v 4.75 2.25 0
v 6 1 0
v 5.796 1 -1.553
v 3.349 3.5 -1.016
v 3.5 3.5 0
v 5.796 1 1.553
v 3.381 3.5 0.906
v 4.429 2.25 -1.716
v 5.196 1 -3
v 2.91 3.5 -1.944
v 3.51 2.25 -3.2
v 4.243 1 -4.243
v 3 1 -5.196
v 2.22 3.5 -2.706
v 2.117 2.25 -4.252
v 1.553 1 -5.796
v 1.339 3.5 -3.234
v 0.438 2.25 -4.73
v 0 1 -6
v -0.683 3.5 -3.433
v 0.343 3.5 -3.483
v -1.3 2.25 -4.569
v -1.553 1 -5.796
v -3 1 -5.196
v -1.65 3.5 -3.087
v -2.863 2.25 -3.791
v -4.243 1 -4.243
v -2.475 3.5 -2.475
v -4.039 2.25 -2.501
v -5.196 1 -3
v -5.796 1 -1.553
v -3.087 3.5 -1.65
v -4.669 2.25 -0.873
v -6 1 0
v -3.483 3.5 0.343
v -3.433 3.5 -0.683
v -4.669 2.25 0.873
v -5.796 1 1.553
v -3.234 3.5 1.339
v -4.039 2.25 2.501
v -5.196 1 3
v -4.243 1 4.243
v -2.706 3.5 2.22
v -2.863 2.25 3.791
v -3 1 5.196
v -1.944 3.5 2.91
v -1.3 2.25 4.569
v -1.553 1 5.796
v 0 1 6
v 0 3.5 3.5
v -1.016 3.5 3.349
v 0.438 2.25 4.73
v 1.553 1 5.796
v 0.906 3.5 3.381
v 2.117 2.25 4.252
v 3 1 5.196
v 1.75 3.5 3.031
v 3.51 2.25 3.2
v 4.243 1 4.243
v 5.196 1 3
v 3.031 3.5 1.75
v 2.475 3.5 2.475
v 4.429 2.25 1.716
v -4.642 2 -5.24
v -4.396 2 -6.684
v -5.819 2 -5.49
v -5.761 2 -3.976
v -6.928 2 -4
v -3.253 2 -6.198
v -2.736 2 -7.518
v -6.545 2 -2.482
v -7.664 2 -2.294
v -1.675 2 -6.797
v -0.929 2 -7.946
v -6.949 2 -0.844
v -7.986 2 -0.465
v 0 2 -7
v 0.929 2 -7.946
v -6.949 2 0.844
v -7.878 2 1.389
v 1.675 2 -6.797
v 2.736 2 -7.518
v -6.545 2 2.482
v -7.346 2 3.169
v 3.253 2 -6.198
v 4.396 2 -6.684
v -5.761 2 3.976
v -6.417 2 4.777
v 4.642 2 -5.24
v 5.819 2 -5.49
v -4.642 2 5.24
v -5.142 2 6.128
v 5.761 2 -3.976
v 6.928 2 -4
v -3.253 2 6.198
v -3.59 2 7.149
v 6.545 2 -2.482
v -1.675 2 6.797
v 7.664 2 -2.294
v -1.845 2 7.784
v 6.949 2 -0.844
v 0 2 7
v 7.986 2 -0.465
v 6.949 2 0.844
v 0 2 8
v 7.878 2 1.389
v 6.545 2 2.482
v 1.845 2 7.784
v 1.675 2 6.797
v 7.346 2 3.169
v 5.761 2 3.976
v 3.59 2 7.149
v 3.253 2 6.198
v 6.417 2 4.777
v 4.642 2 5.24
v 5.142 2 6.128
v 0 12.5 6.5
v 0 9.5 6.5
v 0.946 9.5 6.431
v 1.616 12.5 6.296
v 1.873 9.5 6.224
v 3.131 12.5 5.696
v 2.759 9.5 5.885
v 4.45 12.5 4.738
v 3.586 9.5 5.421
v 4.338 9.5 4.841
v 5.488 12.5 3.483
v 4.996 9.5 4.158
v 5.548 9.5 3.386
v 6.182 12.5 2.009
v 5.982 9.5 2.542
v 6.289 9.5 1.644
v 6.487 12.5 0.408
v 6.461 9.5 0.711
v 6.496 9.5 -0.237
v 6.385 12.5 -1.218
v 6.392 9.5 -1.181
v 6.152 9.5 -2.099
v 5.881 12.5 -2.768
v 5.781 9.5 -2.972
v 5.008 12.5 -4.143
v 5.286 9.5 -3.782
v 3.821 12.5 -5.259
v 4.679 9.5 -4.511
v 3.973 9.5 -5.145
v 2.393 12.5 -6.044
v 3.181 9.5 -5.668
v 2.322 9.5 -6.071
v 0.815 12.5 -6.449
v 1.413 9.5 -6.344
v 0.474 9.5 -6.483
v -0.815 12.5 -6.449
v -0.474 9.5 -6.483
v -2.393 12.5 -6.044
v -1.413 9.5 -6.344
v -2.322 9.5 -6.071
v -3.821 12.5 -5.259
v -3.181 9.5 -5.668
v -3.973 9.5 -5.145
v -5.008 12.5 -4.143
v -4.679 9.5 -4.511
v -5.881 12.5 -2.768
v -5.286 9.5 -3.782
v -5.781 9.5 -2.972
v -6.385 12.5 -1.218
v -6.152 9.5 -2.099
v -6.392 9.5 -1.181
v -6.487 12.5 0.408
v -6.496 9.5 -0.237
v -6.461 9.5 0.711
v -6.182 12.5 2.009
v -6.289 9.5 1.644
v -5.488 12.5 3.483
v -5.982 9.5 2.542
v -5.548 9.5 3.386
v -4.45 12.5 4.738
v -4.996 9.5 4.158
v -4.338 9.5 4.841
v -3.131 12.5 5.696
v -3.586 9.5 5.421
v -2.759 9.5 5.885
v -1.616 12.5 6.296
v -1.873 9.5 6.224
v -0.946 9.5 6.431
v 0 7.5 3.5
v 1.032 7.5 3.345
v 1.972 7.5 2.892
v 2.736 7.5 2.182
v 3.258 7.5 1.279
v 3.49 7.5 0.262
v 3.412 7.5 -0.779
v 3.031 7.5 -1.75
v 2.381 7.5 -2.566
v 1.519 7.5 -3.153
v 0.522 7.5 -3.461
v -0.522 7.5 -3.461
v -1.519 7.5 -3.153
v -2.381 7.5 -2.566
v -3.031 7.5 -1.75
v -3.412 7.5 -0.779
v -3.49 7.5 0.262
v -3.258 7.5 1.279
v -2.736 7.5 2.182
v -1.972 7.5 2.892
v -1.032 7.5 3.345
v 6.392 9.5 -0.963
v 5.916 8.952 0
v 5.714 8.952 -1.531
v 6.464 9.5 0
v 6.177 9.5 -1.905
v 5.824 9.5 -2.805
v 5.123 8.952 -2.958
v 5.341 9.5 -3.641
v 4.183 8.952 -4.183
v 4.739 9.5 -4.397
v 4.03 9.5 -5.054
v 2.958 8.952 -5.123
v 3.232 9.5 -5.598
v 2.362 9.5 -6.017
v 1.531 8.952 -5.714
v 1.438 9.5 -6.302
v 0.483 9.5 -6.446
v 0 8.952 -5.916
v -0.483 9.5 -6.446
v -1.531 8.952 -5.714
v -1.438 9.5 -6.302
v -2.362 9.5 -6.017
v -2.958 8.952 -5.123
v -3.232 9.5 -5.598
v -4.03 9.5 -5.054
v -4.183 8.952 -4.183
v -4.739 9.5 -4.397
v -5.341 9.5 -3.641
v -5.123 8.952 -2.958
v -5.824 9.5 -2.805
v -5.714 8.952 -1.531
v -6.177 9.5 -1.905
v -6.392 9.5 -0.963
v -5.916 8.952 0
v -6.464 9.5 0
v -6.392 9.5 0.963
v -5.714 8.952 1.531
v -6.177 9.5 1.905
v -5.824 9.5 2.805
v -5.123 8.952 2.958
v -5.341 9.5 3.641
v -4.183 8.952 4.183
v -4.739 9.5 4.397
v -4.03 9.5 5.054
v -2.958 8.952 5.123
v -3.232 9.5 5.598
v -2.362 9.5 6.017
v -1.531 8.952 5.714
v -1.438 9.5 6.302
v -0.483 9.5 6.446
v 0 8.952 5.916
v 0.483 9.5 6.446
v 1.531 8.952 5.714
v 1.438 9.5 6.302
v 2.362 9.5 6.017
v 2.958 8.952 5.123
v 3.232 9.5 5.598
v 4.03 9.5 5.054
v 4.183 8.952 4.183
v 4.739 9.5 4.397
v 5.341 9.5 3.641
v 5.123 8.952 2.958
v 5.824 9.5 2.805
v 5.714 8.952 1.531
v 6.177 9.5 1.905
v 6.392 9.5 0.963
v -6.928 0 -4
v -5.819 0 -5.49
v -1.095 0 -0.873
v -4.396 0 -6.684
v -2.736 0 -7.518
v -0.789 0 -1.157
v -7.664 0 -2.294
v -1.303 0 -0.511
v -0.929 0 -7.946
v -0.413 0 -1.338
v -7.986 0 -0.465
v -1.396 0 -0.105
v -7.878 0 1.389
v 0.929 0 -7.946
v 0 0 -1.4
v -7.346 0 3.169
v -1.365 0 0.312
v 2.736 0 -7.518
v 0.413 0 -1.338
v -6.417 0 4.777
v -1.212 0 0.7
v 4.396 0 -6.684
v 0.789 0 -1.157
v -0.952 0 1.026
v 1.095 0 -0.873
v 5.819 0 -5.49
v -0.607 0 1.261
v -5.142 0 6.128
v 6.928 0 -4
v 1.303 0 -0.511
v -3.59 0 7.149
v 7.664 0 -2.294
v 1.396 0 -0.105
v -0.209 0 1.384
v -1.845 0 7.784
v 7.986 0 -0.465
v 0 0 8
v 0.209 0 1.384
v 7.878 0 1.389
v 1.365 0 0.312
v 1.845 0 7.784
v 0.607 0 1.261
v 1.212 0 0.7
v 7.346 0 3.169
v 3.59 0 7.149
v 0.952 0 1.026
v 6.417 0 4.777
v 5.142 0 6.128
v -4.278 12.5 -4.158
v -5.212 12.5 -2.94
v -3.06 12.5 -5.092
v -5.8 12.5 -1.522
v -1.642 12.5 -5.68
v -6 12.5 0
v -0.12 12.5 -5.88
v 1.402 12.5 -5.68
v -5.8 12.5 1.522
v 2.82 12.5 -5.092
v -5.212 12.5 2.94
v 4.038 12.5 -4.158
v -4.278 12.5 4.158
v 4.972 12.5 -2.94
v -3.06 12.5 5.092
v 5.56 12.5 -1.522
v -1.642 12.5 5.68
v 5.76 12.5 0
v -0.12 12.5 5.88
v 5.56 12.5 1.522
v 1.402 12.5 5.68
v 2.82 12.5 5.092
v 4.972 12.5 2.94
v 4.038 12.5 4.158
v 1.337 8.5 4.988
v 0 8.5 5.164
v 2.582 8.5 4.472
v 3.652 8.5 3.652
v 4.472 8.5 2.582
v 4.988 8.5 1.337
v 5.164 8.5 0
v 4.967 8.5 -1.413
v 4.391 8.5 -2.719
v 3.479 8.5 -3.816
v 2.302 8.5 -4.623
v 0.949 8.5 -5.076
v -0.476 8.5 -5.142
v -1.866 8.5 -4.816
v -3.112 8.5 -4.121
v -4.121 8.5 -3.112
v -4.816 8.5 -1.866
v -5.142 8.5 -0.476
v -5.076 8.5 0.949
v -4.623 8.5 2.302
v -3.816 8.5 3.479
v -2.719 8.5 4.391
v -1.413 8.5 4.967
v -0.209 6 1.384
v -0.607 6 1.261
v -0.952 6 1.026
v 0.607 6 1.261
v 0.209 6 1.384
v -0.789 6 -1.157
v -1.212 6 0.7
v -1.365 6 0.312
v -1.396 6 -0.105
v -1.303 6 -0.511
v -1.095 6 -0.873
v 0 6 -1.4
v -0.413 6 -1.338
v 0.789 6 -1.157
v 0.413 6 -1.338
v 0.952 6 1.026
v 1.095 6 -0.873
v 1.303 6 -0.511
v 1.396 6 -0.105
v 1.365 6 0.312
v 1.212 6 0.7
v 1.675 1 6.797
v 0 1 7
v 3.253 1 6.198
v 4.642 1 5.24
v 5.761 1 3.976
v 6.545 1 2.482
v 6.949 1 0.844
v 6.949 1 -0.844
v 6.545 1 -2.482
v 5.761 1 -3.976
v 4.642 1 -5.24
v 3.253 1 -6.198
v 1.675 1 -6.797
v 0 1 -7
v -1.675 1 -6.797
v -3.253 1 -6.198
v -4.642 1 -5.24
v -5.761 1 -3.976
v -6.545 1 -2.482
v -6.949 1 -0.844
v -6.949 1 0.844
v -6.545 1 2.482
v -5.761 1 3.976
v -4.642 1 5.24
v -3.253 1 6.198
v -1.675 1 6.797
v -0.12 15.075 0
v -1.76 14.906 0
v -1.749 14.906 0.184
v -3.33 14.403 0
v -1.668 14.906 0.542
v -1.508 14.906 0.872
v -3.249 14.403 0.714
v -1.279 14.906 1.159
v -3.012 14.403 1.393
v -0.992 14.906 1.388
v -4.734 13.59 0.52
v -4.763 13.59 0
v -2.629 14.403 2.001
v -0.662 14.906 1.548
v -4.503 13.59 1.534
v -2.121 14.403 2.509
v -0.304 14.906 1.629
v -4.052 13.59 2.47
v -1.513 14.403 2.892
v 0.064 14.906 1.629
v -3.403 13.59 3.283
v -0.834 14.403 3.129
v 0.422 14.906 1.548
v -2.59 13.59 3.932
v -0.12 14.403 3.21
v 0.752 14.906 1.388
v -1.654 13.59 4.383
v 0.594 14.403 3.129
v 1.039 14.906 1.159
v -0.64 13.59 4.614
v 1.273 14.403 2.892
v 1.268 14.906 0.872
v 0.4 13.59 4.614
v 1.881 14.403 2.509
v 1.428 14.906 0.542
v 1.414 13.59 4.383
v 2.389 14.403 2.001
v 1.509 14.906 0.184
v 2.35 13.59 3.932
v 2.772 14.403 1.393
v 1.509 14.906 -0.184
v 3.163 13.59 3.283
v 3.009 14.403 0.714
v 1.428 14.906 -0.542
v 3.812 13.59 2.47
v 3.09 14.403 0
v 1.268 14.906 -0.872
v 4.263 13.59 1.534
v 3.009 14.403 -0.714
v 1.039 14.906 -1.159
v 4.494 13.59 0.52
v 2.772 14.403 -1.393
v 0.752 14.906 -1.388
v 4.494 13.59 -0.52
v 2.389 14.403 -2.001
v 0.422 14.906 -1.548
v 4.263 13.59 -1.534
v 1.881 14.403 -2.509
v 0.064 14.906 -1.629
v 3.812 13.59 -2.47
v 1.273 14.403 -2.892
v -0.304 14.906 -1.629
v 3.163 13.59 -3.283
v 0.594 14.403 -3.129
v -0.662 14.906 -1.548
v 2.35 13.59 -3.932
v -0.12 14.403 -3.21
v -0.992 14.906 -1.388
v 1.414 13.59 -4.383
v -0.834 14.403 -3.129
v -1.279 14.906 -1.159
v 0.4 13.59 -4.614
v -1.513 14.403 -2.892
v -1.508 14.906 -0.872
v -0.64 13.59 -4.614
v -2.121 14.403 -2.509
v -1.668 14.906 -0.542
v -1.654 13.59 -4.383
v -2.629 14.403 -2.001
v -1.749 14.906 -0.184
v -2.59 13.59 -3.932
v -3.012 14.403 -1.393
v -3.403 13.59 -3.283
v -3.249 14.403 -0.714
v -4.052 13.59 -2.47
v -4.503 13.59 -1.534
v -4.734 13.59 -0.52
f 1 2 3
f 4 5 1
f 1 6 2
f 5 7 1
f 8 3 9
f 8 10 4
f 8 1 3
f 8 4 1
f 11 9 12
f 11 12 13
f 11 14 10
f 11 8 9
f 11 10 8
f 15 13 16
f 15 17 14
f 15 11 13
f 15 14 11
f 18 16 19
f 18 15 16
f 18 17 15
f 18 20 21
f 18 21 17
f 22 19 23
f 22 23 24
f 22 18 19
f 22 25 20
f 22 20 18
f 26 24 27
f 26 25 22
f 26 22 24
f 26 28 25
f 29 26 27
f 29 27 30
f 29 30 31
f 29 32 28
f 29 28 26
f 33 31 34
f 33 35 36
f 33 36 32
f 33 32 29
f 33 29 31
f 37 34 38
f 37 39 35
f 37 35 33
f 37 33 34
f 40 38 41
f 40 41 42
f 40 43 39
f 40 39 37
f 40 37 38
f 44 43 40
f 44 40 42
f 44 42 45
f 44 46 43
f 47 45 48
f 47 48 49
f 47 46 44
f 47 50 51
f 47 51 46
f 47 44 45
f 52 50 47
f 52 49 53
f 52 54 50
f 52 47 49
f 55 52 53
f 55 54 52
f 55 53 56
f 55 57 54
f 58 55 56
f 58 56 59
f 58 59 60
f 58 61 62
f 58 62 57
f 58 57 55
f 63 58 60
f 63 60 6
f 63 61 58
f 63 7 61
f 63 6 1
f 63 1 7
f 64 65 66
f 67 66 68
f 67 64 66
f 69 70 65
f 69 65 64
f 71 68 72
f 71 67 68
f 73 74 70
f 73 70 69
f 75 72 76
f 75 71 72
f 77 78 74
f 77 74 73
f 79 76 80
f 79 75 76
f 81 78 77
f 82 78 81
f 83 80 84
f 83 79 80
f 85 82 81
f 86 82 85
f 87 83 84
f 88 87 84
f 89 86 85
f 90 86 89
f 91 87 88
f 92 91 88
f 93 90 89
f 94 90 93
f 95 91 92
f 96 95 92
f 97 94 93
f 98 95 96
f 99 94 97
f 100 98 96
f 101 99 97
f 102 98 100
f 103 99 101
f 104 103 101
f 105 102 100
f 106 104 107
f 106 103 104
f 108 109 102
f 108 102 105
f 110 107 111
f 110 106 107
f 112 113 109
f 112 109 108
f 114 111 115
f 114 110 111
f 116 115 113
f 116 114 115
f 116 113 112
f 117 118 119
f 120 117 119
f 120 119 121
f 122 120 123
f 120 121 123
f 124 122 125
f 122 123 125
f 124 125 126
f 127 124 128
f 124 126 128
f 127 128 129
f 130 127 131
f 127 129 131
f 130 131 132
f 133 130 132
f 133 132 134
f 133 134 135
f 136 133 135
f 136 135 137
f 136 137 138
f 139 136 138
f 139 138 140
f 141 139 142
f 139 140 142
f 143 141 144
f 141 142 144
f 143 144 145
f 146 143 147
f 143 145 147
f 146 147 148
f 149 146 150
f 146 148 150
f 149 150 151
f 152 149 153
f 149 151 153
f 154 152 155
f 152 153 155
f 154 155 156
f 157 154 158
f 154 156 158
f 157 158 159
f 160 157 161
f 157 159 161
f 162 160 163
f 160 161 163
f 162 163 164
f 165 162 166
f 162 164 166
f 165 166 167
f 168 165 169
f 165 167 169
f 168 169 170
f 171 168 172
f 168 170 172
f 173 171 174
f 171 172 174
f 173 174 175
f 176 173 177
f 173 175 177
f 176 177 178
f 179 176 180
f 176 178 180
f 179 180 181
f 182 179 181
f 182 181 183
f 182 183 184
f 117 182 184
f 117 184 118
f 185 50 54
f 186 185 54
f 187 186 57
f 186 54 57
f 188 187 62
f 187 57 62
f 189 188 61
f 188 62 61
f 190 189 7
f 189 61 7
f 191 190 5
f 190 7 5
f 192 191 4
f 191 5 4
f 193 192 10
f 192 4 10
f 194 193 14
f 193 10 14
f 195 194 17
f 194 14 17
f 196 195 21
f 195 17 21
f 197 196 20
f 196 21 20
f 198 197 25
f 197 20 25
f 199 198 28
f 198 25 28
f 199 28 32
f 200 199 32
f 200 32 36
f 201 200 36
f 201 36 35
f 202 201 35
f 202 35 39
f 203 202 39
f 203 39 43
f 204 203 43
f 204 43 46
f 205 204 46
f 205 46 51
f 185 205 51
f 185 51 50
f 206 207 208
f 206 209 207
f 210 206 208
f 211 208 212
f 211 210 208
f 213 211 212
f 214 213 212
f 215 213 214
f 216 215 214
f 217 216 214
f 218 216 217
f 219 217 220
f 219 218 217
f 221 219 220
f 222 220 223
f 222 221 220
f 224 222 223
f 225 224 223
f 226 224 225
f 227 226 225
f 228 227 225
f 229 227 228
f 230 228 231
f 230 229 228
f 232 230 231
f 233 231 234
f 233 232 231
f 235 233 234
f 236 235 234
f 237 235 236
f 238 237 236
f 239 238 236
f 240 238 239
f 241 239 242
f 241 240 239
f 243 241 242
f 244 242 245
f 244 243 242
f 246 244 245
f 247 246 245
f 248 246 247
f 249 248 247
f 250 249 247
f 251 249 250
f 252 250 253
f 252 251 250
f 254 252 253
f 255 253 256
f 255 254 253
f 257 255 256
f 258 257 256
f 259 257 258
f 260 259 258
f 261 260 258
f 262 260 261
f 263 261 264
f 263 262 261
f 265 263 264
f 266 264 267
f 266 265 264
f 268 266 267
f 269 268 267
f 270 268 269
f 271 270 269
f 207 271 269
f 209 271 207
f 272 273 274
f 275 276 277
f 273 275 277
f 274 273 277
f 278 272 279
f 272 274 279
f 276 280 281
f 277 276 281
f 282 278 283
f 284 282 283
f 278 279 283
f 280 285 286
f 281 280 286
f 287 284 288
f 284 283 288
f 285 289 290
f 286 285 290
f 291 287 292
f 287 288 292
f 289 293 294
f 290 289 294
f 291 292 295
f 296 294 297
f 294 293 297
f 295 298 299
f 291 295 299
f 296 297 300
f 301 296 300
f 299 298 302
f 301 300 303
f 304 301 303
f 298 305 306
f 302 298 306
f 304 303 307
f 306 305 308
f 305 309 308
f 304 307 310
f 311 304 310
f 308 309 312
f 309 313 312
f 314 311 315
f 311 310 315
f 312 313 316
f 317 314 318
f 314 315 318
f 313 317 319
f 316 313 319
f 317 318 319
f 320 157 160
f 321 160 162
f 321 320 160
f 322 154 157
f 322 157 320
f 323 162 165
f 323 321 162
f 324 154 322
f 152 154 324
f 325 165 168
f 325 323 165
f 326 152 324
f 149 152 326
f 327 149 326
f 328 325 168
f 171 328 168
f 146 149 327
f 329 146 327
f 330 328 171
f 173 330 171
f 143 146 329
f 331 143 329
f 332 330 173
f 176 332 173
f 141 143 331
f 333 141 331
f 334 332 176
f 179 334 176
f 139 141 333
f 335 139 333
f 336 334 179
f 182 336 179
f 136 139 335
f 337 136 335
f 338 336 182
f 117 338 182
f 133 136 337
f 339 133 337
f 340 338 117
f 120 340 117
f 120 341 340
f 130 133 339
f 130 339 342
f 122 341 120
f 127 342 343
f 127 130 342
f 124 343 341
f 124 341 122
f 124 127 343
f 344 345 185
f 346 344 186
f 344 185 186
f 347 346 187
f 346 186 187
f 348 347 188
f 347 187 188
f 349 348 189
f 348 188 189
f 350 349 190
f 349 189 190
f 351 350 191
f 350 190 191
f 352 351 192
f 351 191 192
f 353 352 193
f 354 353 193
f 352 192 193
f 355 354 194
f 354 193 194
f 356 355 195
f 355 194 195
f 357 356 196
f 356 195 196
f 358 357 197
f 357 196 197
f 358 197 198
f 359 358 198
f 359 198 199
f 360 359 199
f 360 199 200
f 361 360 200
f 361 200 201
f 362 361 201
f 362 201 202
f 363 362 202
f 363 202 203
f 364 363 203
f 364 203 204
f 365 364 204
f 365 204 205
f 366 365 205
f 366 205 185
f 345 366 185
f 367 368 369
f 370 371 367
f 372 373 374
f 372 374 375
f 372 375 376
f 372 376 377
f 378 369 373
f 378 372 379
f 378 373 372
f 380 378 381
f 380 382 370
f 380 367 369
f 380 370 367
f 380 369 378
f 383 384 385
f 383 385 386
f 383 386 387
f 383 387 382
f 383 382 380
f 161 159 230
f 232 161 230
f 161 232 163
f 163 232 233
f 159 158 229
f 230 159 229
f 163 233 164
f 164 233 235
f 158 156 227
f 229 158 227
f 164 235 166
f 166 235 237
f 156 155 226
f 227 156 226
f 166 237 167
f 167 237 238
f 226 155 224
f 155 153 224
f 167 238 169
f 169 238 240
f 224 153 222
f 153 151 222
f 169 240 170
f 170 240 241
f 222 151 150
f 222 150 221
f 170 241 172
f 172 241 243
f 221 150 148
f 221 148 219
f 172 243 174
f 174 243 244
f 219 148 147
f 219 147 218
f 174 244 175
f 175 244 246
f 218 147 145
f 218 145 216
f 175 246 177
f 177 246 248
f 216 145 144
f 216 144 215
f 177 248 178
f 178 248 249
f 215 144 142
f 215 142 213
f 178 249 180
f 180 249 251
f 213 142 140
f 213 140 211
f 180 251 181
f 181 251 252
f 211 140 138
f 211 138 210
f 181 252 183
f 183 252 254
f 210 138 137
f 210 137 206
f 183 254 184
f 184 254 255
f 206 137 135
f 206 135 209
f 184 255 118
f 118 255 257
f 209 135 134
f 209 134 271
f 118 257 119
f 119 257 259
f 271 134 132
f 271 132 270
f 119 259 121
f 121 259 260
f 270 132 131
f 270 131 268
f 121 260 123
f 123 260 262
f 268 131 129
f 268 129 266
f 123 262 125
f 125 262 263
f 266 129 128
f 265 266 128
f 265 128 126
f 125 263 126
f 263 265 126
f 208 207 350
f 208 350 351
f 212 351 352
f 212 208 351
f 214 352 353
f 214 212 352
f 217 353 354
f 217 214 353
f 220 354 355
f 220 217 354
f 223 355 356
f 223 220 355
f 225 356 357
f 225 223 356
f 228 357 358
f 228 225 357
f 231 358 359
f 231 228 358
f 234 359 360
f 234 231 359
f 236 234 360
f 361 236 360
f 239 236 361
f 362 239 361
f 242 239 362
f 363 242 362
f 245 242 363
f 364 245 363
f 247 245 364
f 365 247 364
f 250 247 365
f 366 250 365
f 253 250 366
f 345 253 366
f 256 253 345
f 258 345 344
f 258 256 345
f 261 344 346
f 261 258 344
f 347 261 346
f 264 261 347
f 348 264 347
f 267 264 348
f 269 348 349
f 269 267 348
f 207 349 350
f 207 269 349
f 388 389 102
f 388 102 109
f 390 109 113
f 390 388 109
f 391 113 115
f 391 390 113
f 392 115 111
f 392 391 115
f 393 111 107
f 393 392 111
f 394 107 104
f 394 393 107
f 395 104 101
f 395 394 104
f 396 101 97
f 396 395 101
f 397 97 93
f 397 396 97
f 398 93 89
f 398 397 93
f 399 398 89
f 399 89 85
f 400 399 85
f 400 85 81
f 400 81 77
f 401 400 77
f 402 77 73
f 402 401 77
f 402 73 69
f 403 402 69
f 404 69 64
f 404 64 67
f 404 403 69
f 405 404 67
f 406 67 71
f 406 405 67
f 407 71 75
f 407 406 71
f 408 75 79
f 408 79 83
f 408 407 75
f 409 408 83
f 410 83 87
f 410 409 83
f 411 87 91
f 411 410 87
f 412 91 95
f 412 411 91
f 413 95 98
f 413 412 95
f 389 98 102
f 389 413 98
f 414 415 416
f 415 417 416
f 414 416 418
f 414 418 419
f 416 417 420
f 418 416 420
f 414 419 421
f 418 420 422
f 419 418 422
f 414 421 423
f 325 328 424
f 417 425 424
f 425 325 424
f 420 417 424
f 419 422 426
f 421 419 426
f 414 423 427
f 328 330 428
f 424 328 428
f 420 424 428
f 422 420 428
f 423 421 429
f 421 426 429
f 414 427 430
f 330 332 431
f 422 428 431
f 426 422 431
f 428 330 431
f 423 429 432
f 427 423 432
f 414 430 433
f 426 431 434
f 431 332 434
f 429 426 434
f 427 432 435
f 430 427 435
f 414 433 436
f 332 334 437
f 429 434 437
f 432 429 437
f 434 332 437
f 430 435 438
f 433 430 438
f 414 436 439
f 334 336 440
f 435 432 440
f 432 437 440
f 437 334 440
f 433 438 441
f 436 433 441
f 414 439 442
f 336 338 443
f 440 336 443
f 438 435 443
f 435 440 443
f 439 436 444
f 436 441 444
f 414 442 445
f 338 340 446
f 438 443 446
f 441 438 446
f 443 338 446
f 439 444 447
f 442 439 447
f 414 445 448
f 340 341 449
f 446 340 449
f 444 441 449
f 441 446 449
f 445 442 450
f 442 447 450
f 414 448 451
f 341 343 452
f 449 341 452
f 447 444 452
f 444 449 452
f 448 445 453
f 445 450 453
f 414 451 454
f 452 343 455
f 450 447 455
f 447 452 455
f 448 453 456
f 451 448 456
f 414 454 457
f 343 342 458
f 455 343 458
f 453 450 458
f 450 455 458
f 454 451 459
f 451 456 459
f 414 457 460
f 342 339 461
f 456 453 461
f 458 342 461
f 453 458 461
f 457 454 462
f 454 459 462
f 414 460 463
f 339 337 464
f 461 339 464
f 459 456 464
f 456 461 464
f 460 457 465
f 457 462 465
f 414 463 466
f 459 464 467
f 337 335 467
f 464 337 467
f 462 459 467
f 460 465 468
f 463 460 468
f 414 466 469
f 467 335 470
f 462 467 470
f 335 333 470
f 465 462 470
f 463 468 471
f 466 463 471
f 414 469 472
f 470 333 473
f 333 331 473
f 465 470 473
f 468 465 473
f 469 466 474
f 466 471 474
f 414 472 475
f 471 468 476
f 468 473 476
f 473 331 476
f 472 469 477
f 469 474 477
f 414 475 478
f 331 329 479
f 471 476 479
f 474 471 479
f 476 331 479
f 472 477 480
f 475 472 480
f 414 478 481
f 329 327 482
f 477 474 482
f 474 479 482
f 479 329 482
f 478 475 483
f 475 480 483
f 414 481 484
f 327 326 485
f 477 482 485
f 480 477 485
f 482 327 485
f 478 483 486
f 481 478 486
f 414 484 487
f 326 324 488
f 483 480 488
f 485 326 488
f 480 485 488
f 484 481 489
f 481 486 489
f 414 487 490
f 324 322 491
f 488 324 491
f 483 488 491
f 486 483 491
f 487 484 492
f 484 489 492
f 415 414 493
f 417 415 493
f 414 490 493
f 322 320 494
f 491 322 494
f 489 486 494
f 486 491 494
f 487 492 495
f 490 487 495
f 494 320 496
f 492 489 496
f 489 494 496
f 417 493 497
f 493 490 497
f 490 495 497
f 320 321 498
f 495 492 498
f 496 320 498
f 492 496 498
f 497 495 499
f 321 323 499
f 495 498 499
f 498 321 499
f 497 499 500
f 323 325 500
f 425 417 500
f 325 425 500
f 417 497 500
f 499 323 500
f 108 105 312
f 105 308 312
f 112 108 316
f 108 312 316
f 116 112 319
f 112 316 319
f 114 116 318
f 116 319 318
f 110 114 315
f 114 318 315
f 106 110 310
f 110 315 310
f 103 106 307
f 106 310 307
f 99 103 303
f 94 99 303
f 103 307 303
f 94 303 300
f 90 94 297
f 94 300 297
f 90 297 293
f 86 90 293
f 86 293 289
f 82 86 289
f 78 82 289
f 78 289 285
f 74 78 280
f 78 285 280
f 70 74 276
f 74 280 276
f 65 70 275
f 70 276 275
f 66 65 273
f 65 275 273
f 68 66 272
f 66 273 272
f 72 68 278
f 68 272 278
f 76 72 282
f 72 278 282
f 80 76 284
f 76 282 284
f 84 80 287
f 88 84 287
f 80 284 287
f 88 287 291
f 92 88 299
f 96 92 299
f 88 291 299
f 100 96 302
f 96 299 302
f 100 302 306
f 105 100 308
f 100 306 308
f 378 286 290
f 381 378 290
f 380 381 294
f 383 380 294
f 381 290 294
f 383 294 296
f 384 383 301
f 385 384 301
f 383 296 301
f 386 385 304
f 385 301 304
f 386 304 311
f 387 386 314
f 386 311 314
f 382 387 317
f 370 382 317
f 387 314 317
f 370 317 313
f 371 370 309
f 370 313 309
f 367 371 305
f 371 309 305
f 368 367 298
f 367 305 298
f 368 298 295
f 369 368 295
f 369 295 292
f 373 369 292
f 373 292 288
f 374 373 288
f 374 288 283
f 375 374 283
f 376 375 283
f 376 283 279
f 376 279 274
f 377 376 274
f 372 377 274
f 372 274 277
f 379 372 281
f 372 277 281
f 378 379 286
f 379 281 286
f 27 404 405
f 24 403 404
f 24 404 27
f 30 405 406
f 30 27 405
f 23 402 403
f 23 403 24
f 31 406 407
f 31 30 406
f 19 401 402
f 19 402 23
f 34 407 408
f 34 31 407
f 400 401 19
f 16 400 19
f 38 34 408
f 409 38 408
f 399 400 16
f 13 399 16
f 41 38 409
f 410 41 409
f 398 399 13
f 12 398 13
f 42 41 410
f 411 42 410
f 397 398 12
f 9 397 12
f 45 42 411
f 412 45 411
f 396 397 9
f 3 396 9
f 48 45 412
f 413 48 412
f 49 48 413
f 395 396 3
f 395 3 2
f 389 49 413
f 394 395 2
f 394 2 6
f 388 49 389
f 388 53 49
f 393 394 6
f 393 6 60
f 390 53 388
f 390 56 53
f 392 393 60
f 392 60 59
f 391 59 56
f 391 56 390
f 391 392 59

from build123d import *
from build123d.topology import SkipClean

# Parameters (mm, degrees)
SKETCH1_R           = 8
BOSS_EXTRUDE1_DEPTH = 1
SKETCH2_R           = 6
BOSS_EXTRUDE2_DEPTH = 2.5
BOSS_EXTRUDE2_TAPER = 45
SKETCH3_R           = 3.5
BOSS_EXTRUDE3_DEPTH = 4
SKETCH4_R           = 3.5
BOSS_EXTRUDE4_DEPTH = 1
BOSS_EXTRUDE4_DRAFT = -59
SKETCH6_R           = 5.164279482
BOSS_EXTRUDE5_DEPTH = 1
SKETCH7_R           = 6.5
BOSS_EXTRUDE6_DEPTH = 3
SKETCH9_R           = 8
SKETCH9_R_2         = 7
BOSS_EXTRUDE7_DEPTH = 1
SKETCH10_R          = 1.4
CUT_EXTRUDE1_DEPTH  = 6


with BuildPart() as part:
    # Sketch1 → Boss-Extrude1 (new body)
    with BuildSketch(Plane(origin=(0, 0, 0), x_dir=(1, 0, 0), z_dir=(0, 1, 0))):
        with Locations(Location((0, 0, 0), (0, 0, 270))):
            Circle(SKETCH1_R)
    extrude(amount=BOSS_EXTRUDE1_DEPTH)

    # Sketch2 → Boss-Extrude2 (add)
    with BuildSketch(Plane(origin=(0, 1, 0), x_dir=(1, 0, 0), z_dir=(0, 1, 0))):
        Circle(SKETCH2_R)
    extrude(amount=BOSS_EXTRUDE2_DEPTH, taper=BOSS_EXTRUDE2_TAPER)

    # Sketch3 → Boss-Extrude3 (add)
    with BuildSketch(Plane(origin=(0, 3.5, 0), x_dir=(1, 0, 0), z_dir=(0, 1, 0))):
        with Locations(Location((0, 0, 0), (0, 0, 270))):
            Circle(SKETCH3_R)
    extrude(amount=BOSS_EXTRUDE3_DEPTH)


with BuildPart() as boss_extrude4_tool:
    # Sketch4 → Boss-Extrude4 (with draft: the straight prism first)
    with BuildSketch(Plane(origin=(0, 7.5, 0), x_dir=(1, 0, 0), z_dir=(0, 1, 0))):
        with Locations(Location((0, 0, 0), (0, 0, 270))):
            Circle(SKETCH4_R)
    extrude(amount=BOSS_EXTRUDE4_DEPTH)
    # Boss-Extrude4: the draft: its side faces are tilted about the plane it starts from
    boss_extrude4_sides = [boss_extrude4_tool.faces().sort_by_distance(p)[0] for p in [
        (0, 8, -3.5),
    ]]
    draft(boss_extrude4_sides, Plane(origin=(0, 7.5, 0), x_dir=(1, 0, 0), z_dir=(0, 1, 0)), BOSS_EXTRUDE4_DRAFT)


with BuildPart() as part_1:
    add(part.part)

    # Boss-Extrude4: add boss_extrude4_tool
    add(boss_extrude4_tool.part)

    # Sketch6 → Boss-Extrude5 (add)
    with BuildSketch(Plane(origin=(0, 8.5, 0), x_dir=(1, 0, 0), z_dir=(0, 1, 0))):
        with Locations(Location((0, 0, 0), (0, 0, 270))):
            Circle(SKETCH6_R)
    extrude(amount=BOSS_EXTRUDE5_DEPTH)

    # Sketch7 → Boss-Extrude6 (add)
    with BuildSketch(Plane(origin=(0, 9.5, 0), x_dir=(1, 0, 0), z_dir=(0, 1, 0))):
        with Locations(Location((0, 0, 0), (0, 0, 270))):
            Circle(SKETCH7_R)
    extrude(amount=BOSS_EXTRUDE6_DEPTH)

    # Sketch8 → Revolve1 (revolve)
    with SkipClean():  # the faces are left unmerged after this step: merging them gives an invalid solid
        with BuildSketch(Plane.XY):
            with BuildLine():
                ThreePointArc((-0.12, 15.075463153), (-3.329649921, 14.403365131), (-6, 12.5))
                Line((-6, 12.5), (-0.12, 12.5))
                Line((-0.12, 12.5), (-0.12, 15.075463153))
            make_face()
            with BuildLine():
                Line((-0.12, 15.075463153), (-0.12, 12.5))
                Line((-0.12, 12.5), (5.76, 12.5))
                ThreePointArc((5.76, 12.5), (3.089649921, 14.403365131), (-0.12, 15.075463153))
            make_face()
        revolve(axis=Axis((-0.12, 12.5, 0), (0, 1, 0)))
    add(part_1.part.scale(1), mode=Mode.REPLACE)  # the faces are merged on a copy

    # Sketch9 → Boss-Extrude7 (add)
    with BuildSketch(Plane(origin=(0, 1, 0), x_dir=(1, 0, 0), z_dir=(0, 1, 0))):
        with Locations(Location((0, 0, 0), (0, 0, 270))):
            Circle(SKETCH9_R)
        with Locations(Location((0, 0, 0), (0, 0, 270))):
            Circle(SKETCH9_R_2, mode=Mode.SUBTRACT)
    extrude(amount=BOSS_EXTRUDE7_DEPTH)

    # Sketch10 → Cut-Extrude1 (cut)
    with BuildSketch(Plane.XZ):
        with Locations(Location((0, 0, 0), (0, 0, 270))):
            Circle(SKETCH10_R)
    extrude(amount=-CUT_EXTRUDE1_DEPTH, mode=Mode.SUBTRACT)

    # Chamfer1: read off the stored shape, not the designer's step
    # Chamfer1 outline → Chamfer1 (revolve)
    with BuildSketch(Plane.XY):
        Polygon((5.164279482, 9.5), (5.164279482, 8.5), (5.915896622, 8.95161714), (6.464279482, 9.5), align=None)
    revolve(axis=Axis((0, 0, 0), (0, 1, 0)))


solid = part_1.part
